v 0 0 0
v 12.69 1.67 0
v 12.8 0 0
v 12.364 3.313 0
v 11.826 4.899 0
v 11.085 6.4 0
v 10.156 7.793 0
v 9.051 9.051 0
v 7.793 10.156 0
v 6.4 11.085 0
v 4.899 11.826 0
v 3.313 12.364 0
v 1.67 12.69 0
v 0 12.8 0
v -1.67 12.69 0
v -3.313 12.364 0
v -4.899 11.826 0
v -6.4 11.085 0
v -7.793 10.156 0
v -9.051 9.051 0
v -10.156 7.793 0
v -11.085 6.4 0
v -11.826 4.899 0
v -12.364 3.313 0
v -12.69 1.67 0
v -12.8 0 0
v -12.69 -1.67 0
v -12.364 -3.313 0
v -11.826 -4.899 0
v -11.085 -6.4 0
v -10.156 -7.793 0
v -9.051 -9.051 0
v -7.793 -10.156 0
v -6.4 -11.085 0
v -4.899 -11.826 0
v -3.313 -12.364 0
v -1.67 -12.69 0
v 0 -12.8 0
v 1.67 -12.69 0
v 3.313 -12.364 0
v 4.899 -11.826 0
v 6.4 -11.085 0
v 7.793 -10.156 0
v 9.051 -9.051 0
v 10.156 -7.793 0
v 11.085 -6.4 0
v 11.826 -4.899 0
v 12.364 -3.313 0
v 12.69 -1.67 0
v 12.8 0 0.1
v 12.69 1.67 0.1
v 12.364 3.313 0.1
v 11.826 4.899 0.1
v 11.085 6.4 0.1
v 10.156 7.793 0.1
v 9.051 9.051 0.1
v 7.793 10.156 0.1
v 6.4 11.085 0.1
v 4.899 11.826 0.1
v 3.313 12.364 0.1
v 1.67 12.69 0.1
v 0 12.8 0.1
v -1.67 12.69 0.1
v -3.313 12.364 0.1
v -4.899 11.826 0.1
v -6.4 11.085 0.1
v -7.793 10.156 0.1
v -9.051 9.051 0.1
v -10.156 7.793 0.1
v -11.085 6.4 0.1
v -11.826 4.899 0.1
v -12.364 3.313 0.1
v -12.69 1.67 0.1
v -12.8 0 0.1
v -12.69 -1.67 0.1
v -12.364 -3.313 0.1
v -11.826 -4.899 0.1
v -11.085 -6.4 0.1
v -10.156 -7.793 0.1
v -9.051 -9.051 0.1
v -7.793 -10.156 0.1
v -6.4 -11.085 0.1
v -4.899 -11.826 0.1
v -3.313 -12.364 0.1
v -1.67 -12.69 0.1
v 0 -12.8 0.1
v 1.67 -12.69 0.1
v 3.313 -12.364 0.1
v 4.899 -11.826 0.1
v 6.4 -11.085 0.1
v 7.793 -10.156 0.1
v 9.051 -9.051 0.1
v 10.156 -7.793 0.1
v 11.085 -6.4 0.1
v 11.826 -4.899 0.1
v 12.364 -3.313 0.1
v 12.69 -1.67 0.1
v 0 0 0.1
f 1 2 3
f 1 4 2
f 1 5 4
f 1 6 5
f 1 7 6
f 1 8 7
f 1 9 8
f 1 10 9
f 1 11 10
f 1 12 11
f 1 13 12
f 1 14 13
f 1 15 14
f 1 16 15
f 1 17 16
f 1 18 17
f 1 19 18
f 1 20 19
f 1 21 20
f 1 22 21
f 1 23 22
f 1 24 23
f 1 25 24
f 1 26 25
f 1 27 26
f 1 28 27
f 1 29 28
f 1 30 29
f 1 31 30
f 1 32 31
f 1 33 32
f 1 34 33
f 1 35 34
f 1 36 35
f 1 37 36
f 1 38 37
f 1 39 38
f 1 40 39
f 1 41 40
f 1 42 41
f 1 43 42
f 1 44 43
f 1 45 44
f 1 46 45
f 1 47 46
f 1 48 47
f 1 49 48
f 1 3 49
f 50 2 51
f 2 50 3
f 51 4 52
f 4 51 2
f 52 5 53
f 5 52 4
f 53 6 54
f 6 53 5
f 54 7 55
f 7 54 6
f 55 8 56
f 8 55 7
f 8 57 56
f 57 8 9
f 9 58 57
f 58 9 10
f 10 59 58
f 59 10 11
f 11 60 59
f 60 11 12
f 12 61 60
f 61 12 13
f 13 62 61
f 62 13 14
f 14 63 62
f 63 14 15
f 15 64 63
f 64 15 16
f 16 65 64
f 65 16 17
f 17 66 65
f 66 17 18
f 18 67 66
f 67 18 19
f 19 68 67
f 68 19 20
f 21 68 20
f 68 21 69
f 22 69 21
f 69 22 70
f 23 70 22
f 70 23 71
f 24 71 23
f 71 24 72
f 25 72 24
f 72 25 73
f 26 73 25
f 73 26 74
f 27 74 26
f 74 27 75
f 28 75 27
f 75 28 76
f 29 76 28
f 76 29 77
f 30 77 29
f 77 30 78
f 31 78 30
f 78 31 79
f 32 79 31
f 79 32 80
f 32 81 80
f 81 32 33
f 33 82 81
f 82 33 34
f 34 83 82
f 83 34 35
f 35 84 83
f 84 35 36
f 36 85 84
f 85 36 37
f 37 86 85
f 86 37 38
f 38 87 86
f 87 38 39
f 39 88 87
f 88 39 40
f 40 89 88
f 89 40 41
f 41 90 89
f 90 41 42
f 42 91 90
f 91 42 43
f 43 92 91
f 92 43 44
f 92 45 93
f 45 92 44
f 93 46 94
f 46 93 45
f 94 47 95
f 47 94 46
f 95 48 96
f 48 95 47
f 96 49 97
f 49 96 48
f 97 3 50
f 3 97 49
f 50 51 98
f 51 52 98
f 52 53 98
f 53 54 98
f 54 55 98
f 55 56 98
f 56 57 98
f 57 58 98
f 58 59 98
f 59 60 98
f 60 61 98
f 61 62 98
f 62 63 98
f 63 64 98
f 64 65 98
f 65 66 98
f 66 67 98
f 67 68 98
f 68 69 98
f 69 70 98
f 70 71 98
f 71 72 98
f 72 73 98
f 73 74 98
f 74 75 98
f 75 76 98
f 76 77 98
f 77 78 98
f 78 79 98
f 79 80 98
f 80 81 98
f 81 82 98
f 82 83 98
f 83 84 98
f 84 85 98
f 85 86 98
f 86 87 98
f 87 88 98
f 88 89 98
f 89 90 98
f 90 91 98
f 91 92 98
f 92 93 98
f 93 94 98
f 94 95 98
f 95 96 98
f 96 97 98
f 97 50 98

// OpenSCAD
// file: ../p/48/1-4cyli.scad
use <../../lib.scad>
function ldraw_lib__48__1_4cyli() = [
// 0 Hi-Res Cylinder 0.25
// 0 Name: 48\1-4cyli.dat
// 0 Author: Manfred Moolhuysen
// 0 !LDRAW_ORG 48_Primitive UPDATE 2009-01
// 0 !LICENSE Licensed under CC BY 2.0 and CC BY 4.0 : see CAreadme.txt
// 
// 0 BFC CERTIFY CCW
  [0,"BFC","CERTIFY"],
  [0,"BFC","CCW"],
// 
// 0 !HISTORY 1999-07-05 [PTadmin] Official Update 1999-05
// 0 !HISTORY 2002-02-28 [hafhead] Added BFC statement
// 0 !HISTORY 2002-04-25 [PTadmin] Official Update 2002-02
// 0 !HISTORY 2007-06-24 [PTadmin] Header formatted for Contributor Agreement
// 0 !HISTORY 2008-07-01 [PTadmin] Official Update 2008-01
// 0 !HISTORY 2008-07-07 [guyvivan] Made BFC'ed CCW (2005-12-06)
// 0 !HISTORY 2009-05-02 [PTadmin] Official Update 2009-01
// 
// 
// 4 16 0.9914 0 0.1305 1 0 0 1 1 0 0.9914 1 0.1305
  [4,16,0.9914,0,0.1305,1,0,0,1,1,0,0.9914,1,0.1305],
// 4 16 0.9659 0 0.2588 0.9914 0 0.1305 0.9914 1 0.1305 0.9659 1 0.2588
  [4,16,0.9659,0,0.2588,0.9914,0,0.1305,0.9914,1,0.1305,0.9659,1,0.2588],
// 4 16 0.9239 0 0.3827 0.9659 0 0.2588 0.9659 1 0.2588 0.9239 1 0.3827
  [4,16,0.9239,0,0.3827,0.9659,0,0.2588,0.9659,1,0.2588,0.9239,1,0.3827],
// 4 16 0.866 0 0.5 0.9239 0 0.3827 0.9239 1 0.3827 0.866 1 0.5
  [4,16,0.866,0,0.5,0.9239,0,0.3827,0.9239,1,0.3827,0.866,1,0.5],
// 4 16 0.7934 0 0.6088 0.866 0 0.5 0.866 1 0.5 0.7934 1 0.6088
  [4,16,0.7934,0,0.6088,0.866,0,0.5,0.866,1,0.5,0.7934,1,0.6088],
// 4 16 0.7071 0 0.7071 0.7934 0 0.6088 0.7934 1 0.6088 0.7071 1 0.7071
  [4,16,0.7071,0,0.7071,0.7934,0,0.6088,0.7934,1,0.6088,0.7071,1,0.7071],
// 4 16 0.6088 0 0.7934 0.7071 0 0.7071 0.7071 1 0.7071 0.6088 1 0.7934
  [4,16,0.6088,0,0.7934,0.7071,0,0.7071,0.7071,1,0.7071,0.6088,1,0.7934],
// 4 16 0.5 0 0.866 0.6088 0 0.7934 0.6088 1 0.7934 0.5 1 0.866
  [4,16,0.5,0,0.866,0.6088,0,0.7934,0.6088,1,0.7934,0.5,1,0.866],
// 4 16 0.3827 0 0.9239 0.5 0 0.866 0.5 1 0.866 0.3827 1 0.9239
  [4,16,0.3827,0,0.9239,0.5,0,0.866,0.5,1,0.866,0.3827,1,0.9239],
// 4 16 0.2588 0 0.9659 0.3827 0 0.9239 0.3827 1 0.9239 0.2588 1 0.9659
  [4,16,0.2588,0,0.9659,0.3827,0,0.9239,0.3827,1,0.9239,0.2588,1,0.9659],
// 4 16 0.1305 0 0.9914 0.2588 0 0.9659 0.2588 1 0.9659 0.1305 1 0.9914
  [4,16,0.1305,0,0.9914,0.2588,0,0.9659,0.2588,1,0.9659,0.1305,1,0.9914],
// 4 16 0 0 1 0.1305 0 0.9914 0.1305 1 0.9914 0 1 1
  [4,16,0,0,1,0.1305,0,0.9914,0.1305,1,0.9914,0,1,1],
// 
// 0 conditional lines
// 5 24 1 1 0 1 0 0 1 1 -1 0.9914 1 0.1305
  [5,24,1,1,0,1,0,0,1,1,-1,0.9914,1,0.1305],
// 5 24 0.9914 1 0.1305 0.9914 0 0.1305 1 1 0 0.9659 1 0.2588
  [5,24,0.9914,1,0.1305,0.9914,0,0.1305,1,1,0,0.9659,1,0.2588],
// 5 24 0.9659 1 0.2588 0.9659 0 0.2588 0.9914 1 0.1305 0.9239 1 0.3827
  [5,24,0.9659,1,0.2588,0.9659,0,0.2588,0.9914,1,0.1305,0.9239,1,0.3827],
// 5 24 0.9239 1 0.3827 0.9239 0 0.3827 0.9659 1 0.2588 0.866 1 0.5
  [5,24,0.9239,1,0.3827,0.9239,0,0.3827,0.9659,1,0.2588,0.866,1,0.5],
// 5 24 0.866 1 0.5 0.866 0 0.5 0.9239 1 0.3827 0.7934 1 0.6088
  [5,24,0.866,1,0.5,0.866,0,0.5,0.9239,1,0.3827,0.7934,1,0.6088],
// 5 24 0.7934 1 0.6088 0.7934 0 0.6088 0.866 1 0.5 0.7071 1 0.7071
  [5,24,0.7934,1,0.6088,0.7934,0,0.6088,0.866,1,0.5,0.7071,1,0.7071],
// 5 24 0.7071 1 0.7071 0.7071 0 0.7071 0.7934 1 0.6088 0.6088 1 0.7934
  [5,24,0.7071,1,0.7071,0.7071,0,0.7071,0.7934,1,0.6088,0.6088,1,0.7934],
// 5 24 0.6088 1 0.7934 0.6088 0 0.7934 0.7071 1 0.7071 0.5 1 0.866
  [5,24,0.6088,1,0.7934,0.6088,0,0.7934,0.7071,1,0.7071,0.5,1,0.866],
// 5 24 0.5 1 0.866 0.5 0 0.866 0.6088 1 0.7934 0.3827 1 0.9239
  [5,24,0.5,1,0.866,0.5,0,0.866,0.6088,1,0.7934,0.3827,1,0.9239],
// 5 24 0.3827 1 0.9239 0.3827 0 0.9239 0.5 1 0.866 0.2588 1 0.9659
  [5,24,0.3827,1,0.9239,0.3827,0,0.9239,0.5,1,0.866,0.2588,1,0.9659],
// 5 24 0.2588 1 0.9659 0.2588 0 0.9659 0.3827 1 0.9239 0.1305 1 0.9914
  [5,24,0.2588,1,0.9659,0.2588,0,0.9659,0.3827,1,0.9239,0.1305,1,0.9914],
// 5 24 0.1305 1 0.9914 0.1305 0 0.9914 0.2588 1 0.9659 0 1 1
  [5,24,0.1305,1,0.9914,0.1305,0,0.9914,0.2588,1,0.9659,0,1,1],
// 5 24 0 1 1 0 0 1 0.1305 1 0.9914 -1 1 1
  [5,24,0,1,1,0,0,1,0.1305,1,0.9914,-1,1,1],
// 
// 0 end of file
];
module ldraw_lib__48__1_4cyli(step=0, col=false, unit=2/5, alt=false, line=0.2, solid=!$preview)
    makepoly(ldraw_lib__48__1_4cyli(), step=step, col=col, unit=unit, alt=alt, line=line, solid=solid);
ldraw_lib__48__1_4cyli(line=0.2);
// file: ../p/48/4-4cyli.scad
use <../../lib.scad>
use <1-4cyli.scad>
function ldraw_lib__48__4_4cyli() = [
// 0 Hi-Res Cylinder 1.0
// 0 Name: 48\4-4cyli.dat
// 0 Author: Paul Easter [pneaster]
// 0 !LDRAW_ORG 48_Primitive UPDATE 2012-02
// 0 !LICENSE Licensed under CC BY 4.0 : see CAreadme.txt
// 
// 0 BFC CERTIFY CCW
  [0,"BFC","CERTIFY"],
  [0,"BFC","CCW"],
// 
// 0 !HISTORY 2002-08-18 [PTadmin] Official Update 2002-04
// 0 !HISTORY 2007-06-24 [PTadmin] Header formatted for Contributor Agreement
// 0 !HISTORY 2008-07-01 [PTadmin] Official Update 2008-01
// 0 !HISTORY 2012-02-27 [Philo] Changed to CCW
// 0 !HISTORY 2012-08-09 [PTadmin] Official Update 2012-02
// 
// 
// 1 16 0 0 0 1 0 0 0 1 0 0 0 1 48\1-4cyli.dat
  [1,16,0,0,0,1,0,0,0,1,0,0,0,1, ldraw_lib__48__1_4cyli()],
// 1 16 0 0 0 0 0 -1 0 1 0 1 0 0 48\1-4cyli.dat
  [1,16,0,0,0,0,0,-1,0,1,0,1,0,0, ldraw_lib__48__1_4cyli()],
// 1 16 0 0 0 -1 0 0 0 1 0 0 0 -1 48\1-4cyli.dat
  [1,16,0,0,0,-1,0,0,0,1,0,0,0,-1, ldraw_lib__48__1_4cyli()],
// 1 16 0 0 0 0 0 1 0 1 0 -1 0 0 48\1-4cyli.dat
  [1,16,0,0,0,0,0,1,0,1,0,-1,0,0, ldraw_lib__48__1_4cyli()],
];
module ldraw_lib__48__4_4cyli(step=0, col=false, unit=2/5, alt=false, line=0.2, solid=!$preview)
    makepoly(ldraw_lib__48__4_4cyli(), step=step, col=col, unit=unit, alt=alt, line=line, solid=solid);
ldraw_lib__48__4_4cyli(line=0.2);
// file: ../p/48/4-4disc.scad
use <../../lib.scad>
function ldraw_lib__48__4_4disc() = [
// 0 Hi-Res Disc 1.0
// 0 Name: 48\4-4disc.dat
// 0 Author: Miklos Hosszu [hmick]
// 0 !LDRAW_ORG 48_Primitive UPDATE 2012-02
// 0 !LICENSE Licensed under CC BY 2.0 and CC BY 4.0 : see CAreadme.txt
// 
// 0 BFC CERTIFY CCW
  [0,"BFC","CERTIFY"],
  [0,"BFC","CCW"],
// 
// 0 !HISTORY 2004-11-06 [PTadmin] Official Update 2004-04
// 0 !HISTORY 2007-06-24 [PTadmin] Header formatted for Contributor Agreement
// 0 !HISTORY 2008-07-01 [PTadmin] Official Update 2008-01
// 0 !HISTORY 2012-02-27 [Philo] Changed to CCW
// 0 !HISTORY 2012-08-09 [PTadmin] Official Update 2012-02
// 
// 
// 3 16 1 0 0 0.9914 0 0.1305 0 0 0
  [3,16,1,0,0,0.9914,0,0.1305,0,0,0],
// 3 16 0.9914 0 0.1305 0.9659 0 0.2588 0 0 0
  [3,16,0.9914,0,0.1305,0.9659,0,0.2588,0,0,0],
// 3 16 0.9659 0 0.2588 0.9239 0 0.3827 0 0 0
  [3,16,0.9659,0,0.2588,0.9239,0,0.3827,0,0,0],
// 3 16 0.9239 0 0.3827 0.866 0 0.5 0 0 0
  [3,16,0.9239,0,0.3827,0.866,0,0.5,0,0,0],
// 3 16 0.866 0 0.5 0.7934 0 0.6088 0 0 0
  [3,16,0.866,0,0.5,0.7934,0,0.6088,0,0,0],
// 3 16 0.7934 0 0.6088 0.7071 0 0.7071 0 0 0
  [3,16,0.7934,0,0.6088,0.7071,0,0.7071,0,0,0],
// 3 16 0.7071 0 0.7071 0.6088 0 0.7934 0 0 0
  [3,16,0.7071,0,0.7071,0.6088,0,0.7934,0,0,0],
// 3 16 0.6088 0 0.7934 0.5 0 0.866 0 0 0
  [3,16,0.6088,0,0.7934,0.5,0,0.866,0,0,0],
// 3 16 0.5 0 0.866 0.3827 0 0.9239 0 0 0
  [3,16,0.5,0,0.866,0.3827,0,0.9239,0,0,0],
// 3 16 0.3827 0 0.9239 0.2588 0 0.9659 0 0 0
  [3,16,0.3827,0,0.9239,0.2588,0,0.9659,0,0,0],
// 3 16 0.2588 0 0.9659 0.1305 0 0.9914 0 0 0
  [3,16,0.2588,0,0.9659,0.1305,0,0.9914,0,0,0],
// 3 16 0.1305 0 0.9914 0 0 1 0 0 0
  [3,16,0.1305,0,0.9914,0,0,1,0,0,0],
// 3 16 0 0 1 -0.1305 0 0.9914 0 0 0
  [3,16,0,0,1,-0.1305,0,0.9914,0,0,0],
// 3 16 -0.1305 0 0.9914 -0.2588 0 0.9659 0 0 0
  [3,16,-0.1305,0,0.9914,-0.2588,0,0.9659,0,0,0],
// 3 16 -0.2588 0 0.9659 -0.3827 0 0.9239 0 0 0
  [3,16,-0.2588,0,0.9659,-0.3827,0,0.9239,0,0,0],
// 3 16 -0.3827 0 0.9239 -0.5 0 0.866 0 0 0
  [3,16,-0.3827,0,0.9239,-0.5,0,0.866,0,0,0],
// 3 16 -0.5 0 0.866 -0.6088 0 0.7934 0 0 0
  [3,16,-0.5,0,0.866,-0.6088,0,0.7934,0,0,0],
// 3 16 -0.6088 0 0.7934 -0.7071 0 0.7071 0 0 0
  [3,16,-0.6088,0,0.7934,-0.7071,0,0.7071,0,0,0],
// 3 16 -0.7071 0 0.7071 -0.7934 0 0.6088 0 0 0
  [3,16,-0.7071,0,0.7071,-0.7934,0,0.6088,0,0,0],
// 3 16 -0.7934 0 0.6088 -0.866 0 0.5 0 0 0
  [3,16,-0.7934,0,0.6088,-0.866,0,0.5,0,0,0],
// 3 16 -0.866 0 0.5 -0.9239 0 0.3827 0 0 0
  [3,16,-0.866,0,0.5,-0.9239,0,0.3827,0,0,0],
// 3 16 -0.9239 0 0.3827 -0.9659 0 0.2588 0 0 0
  [3,16,-0.9239,0,0.3827,-0.9659,0,0.2588,0,0,0],
// 3 16 -0.9659 0 0.2588 -0.9914 0 0.1305 0 0 0
  [3,16,-0.9659,0,0.2588,-0.9914,0,0.1305,0,0,0],
// 3 16 -0.9914 0 0.1305 -1 0 0 0 0 0
  [3,16,-0.9914,0,0.1305,-1,0,0,0,0,0],
// 3 16 -1 0 0 -0.9914 0 -0.1305 0 0 0
  [3,16,-1,0,0,-0.9914,0,-0.1305,0,0,0],
// 3 16 -0.9914 0 -0.1305 -0.9659 0 -0.2588 0 0 0
  [3,16,-0.9914,0,-0.1305,-0.9659,0,-0.2588,0,0,0],
// 3 16 -0.9659 0 -0.2588 -0.9239 0 -0.3827 0 0 0
  [3,16,-0.9659,0,-0.2588,-0.9239,0,-0.3827,0,0,0],
// 3 16 -0.9239 0 -0.3827 -0.866 0 -0.5 0 0 0
  [3,16,-0.9239,0,-0.3827,-0.866,0,-0.5,0,0,0],
// 3 16 -0.866 0 -0.5 -0.7934 0 -0.6088 0 0 0
  [3,16,-0.866,0,-0.5,-0.7934,0,-0.6088,0,0,0],
// 3 16 -0.7934 0 -0.6088 -0.7071 0 -0.7071 0 0 0
  [3,16,-0.7934,0,-0.6088,-0.7071,0,-0.7071,0,0,0],
// 3 16 -0.7071 0 -0.7071 -0.6088 0 -0.7934 0 0 0
  [3,16,-0.7071,0,-0.7071,-0.6088,0,-0.7934,0,0,0],
// 3 16 -0.6088 0 -0.7934 -0.5 0 -0.866 0 0 0
  [3,16,-0.6088,0,-0.7934,-0.5,0,-0.866,0,0,0],
// 3 16 -0.5 0 -0.866 -0.3827 0 -0.9239 0 0 0
  [3,16,-0.5,0,-0.866,-0.3827,0,-0.9239,0,0,0],
// 3 16 -0.3827 0 -0.9239 -0.2588 0 -0.9659 0 0 0
  [3,16,-0.3827,0,-0.9239,-0.2588,0,-0.9659,0,0,0],
// 3 16 -0.2588 0 -0.9659 -0.1305 0 -0.9914 0 0 0
  [3,16,-0.2588,0,-0.9659,-0.1305,0,-0.9914,0,0,0],
// 3 16 -0.1305 0 -0.9914 0 0 -1 0 0 0
  [3,16,-0.1305,0,-0.9914,0,0,-1,0,0,0],
// 3 16 0 0 -1 0.1305 0 -0.9914 0 0 0
  [3,16,0,0,-1,0.1305,0,-0.9914,0,0,0],
// 3 16 0.1305 0 -0.9914 0.2588 0 -0.9659 0 0 0
  [3,16,0.1305,0,-0.9914,0.2588,0,-0.9659,0,0,0],
// 3 16 0.2588 0 -0.9659 0.3827 0 -0.9239 0 0 0
  [3,16,0.2588,0,-0.9659,0.3827,0,-0.9239,0,0,0],
// 3 16 0.3827 0 -0.9239 0.5 0 -0.866 0 0 0
  [3,16,0.3827,0,-0.9239,0.5,0,-0.866,0,0,0],
// 3 16 0.5 0 -0.866 0.6088 0 -0.7934 0 0 0
  [3,16,0.5,0,-0.866,0.6088,0,-0.7934,0,0,0],
// 3 16 0.6088 0 -0.7934 0.7071 0 -0.7071 0 0 0
  [3,16,0.6088,0,-0.7934,0.7071,0,-0.7071,0,0,0],
// 3 16 0.7071 0 -0.7071 0.7934 0 -0.6088 0 0 0
  [3,16,0.7071,0,-0.7071,0.7934,0,-0.6088,0,0,0],
// 3 16 0.7934 0 -0.6088 0.866 0 -0.5 0 0 0
  [3,16,0.7934,0,-0.6088,0.866,0,-0.5,0,0,0],
// 3 16 0.866 0 -0.5 0.9239 0 -0.3827 0 0 0
  [3,16,0.866,0,-0.5,0.9239,0,-0.3827,0,0,0],
// 3 16 0.9239 0 -0.3827 0.9659 0 -0.2588 0 0 0
  [3,16,0.9239,0,-0.3827,0.9659,0,-0.2588,0,0,0],
// 3 16 0.9659 0 -0.2588 0.9914 0 -0.1305 0 0 0
  [3,16,0.9659,0,-0.2588,0.9914,0,-0.1305,0,0,0],
// 3 16 0.9914 0 -0.1305 1 0 0 0 0 0
  [3,16,0.9914,0,-0.1305,1,0,0,0,0,0],
];
module ldraw_lib__48__4_4disc(step=0, col=false, unit=2/5, alt=false, line=0.2, solid=!$preview)
    makepoly(ldraw_lib__48__4_4disc(), step=step, col=col, unit=unit, alt=alt, line=line, solid=solid);
ldraw_lib__48__4_4disc(line=0.2);
// file: ../p/48/4-4cylc3.scad
use <../../lib.scad>
use <4-4cyli.scad>
use <4-4disc.scad>
function ldraw_lib__48__4_4cylc3() = [
// 0 Hi-Res Cylinder Closed 1.0 without Top or Bottom Edge Lines
// 0 Name: 48\4-4cylc3.dat
// 0 Author: Chris Dee [cwdee]
// 0 !LDRAW_ORG 48_Primitive UPDATE 2017-01
// 0 !LICENSE Licensed under CC BY 4.0 : see CAreadme.txt
// 
// 0 BFC CERTIFY CCW
  [0,"BFC","CERTIFY"],
  [0,"BFC","CCW"],
// 
// 0 !HISTORY 2017-12-30 [PTadmin] Official Update 2017-01
// 
// 
// 1 16 0 0 0 1 0 0 0 1 0 0 0 1 48\4-4disc.dat
  [1,16,0,0,0,1,0,0,0,1,0,0,0,1, ldraw_lib__48__4_4disc()],
// 1 16 0 0 0 1 0 0 0 1 0 0 0 1 48\4-4cyli.dat
  [1,16,0,0,0,1,0,0,0,1,0,0,0,1, ldraw_lib__48__4_4cyli()],
// 0
];
module ldraw_lib__48__4_4cylc3(step=0, col=false, unit=2/5, alt=false, line=0.2, solid=!$preview)
    makepoly(ldraw_lib__48__4_4cylc3(), step=step, col=col, unit=unit, alt=alt, line=line, solid=solid);
ldraw_lib__48__4_4cylc3(line=0.2);
// main file
use <../lib.scad>
use <../p/48/4-4cylc3.scad>
use <../p/48/4-4disc.scad>
function ldraw_lib__4119430a() = [
// 0 Sticker  3.2 x  3.2 Round Mirror
// 0 Name: 4119430a.dat
// 0 Author: Philippe Hurbain [Philo]
// 0 !LDRAW_ORG Part UPDATE 2017-01
// 0 !LICENSE Licensed under CC BY 4.0 : see CAreadme.txt
// 
// 0 BFC CERTIFY CCW
  [0,"BFC","CERTIFY"],
  [0,"BFC","CCW"],
// 
// 0 !KEYWORDS Belville
// 
// 0 !HISTORY 2010-07-05 [PTadmin] Official Update 2010-02
// 0 !HISTORY 2011-07-11 [PTadmin] Renamed from 72602
// 0 !HISTORY 2011-07-11 [Steffen] used 4-4cylc2.dat
// 0 !HISTORY 2011-07-25 [PTadmin] Official Update 2011-01
// 0 !HISTORY 2017-07-03 [cwdee] Use cylinder primitive with conditional lines
// 0 !HISTORY 2017-12-30 [PTadmin] Official Update 2017-01
// 
// 
// 1 383 0 0 0 32 0 0 0 -0.25 0 0 0 32 48\4-4cylc3.dat
  [1,383,0,0,0,32,0,0,0,-0.25,0,0,0,32, ldraw_lib__48__4_4cylc3()],
// 1 383 0 -0.25 0 32 0 0 0 1 0 0 0 32 48\4-4disc.dat
  [1,383,0,-0.25,0,32,0,0,0,1,0,0,0,32, ldraw_lib__48__4_4disc()],
];
module ldraw_lib__4119430a(step=0, col=false, unit=2/5, alt=false, line=0.2, solid=!$preview)
    makepoly(ldraw_lib__4119430a(), step=step, col=col, unit=unit, alt=alt, line=line, solid=solid);
ldraw_lib__4119430a(line=0.2);
